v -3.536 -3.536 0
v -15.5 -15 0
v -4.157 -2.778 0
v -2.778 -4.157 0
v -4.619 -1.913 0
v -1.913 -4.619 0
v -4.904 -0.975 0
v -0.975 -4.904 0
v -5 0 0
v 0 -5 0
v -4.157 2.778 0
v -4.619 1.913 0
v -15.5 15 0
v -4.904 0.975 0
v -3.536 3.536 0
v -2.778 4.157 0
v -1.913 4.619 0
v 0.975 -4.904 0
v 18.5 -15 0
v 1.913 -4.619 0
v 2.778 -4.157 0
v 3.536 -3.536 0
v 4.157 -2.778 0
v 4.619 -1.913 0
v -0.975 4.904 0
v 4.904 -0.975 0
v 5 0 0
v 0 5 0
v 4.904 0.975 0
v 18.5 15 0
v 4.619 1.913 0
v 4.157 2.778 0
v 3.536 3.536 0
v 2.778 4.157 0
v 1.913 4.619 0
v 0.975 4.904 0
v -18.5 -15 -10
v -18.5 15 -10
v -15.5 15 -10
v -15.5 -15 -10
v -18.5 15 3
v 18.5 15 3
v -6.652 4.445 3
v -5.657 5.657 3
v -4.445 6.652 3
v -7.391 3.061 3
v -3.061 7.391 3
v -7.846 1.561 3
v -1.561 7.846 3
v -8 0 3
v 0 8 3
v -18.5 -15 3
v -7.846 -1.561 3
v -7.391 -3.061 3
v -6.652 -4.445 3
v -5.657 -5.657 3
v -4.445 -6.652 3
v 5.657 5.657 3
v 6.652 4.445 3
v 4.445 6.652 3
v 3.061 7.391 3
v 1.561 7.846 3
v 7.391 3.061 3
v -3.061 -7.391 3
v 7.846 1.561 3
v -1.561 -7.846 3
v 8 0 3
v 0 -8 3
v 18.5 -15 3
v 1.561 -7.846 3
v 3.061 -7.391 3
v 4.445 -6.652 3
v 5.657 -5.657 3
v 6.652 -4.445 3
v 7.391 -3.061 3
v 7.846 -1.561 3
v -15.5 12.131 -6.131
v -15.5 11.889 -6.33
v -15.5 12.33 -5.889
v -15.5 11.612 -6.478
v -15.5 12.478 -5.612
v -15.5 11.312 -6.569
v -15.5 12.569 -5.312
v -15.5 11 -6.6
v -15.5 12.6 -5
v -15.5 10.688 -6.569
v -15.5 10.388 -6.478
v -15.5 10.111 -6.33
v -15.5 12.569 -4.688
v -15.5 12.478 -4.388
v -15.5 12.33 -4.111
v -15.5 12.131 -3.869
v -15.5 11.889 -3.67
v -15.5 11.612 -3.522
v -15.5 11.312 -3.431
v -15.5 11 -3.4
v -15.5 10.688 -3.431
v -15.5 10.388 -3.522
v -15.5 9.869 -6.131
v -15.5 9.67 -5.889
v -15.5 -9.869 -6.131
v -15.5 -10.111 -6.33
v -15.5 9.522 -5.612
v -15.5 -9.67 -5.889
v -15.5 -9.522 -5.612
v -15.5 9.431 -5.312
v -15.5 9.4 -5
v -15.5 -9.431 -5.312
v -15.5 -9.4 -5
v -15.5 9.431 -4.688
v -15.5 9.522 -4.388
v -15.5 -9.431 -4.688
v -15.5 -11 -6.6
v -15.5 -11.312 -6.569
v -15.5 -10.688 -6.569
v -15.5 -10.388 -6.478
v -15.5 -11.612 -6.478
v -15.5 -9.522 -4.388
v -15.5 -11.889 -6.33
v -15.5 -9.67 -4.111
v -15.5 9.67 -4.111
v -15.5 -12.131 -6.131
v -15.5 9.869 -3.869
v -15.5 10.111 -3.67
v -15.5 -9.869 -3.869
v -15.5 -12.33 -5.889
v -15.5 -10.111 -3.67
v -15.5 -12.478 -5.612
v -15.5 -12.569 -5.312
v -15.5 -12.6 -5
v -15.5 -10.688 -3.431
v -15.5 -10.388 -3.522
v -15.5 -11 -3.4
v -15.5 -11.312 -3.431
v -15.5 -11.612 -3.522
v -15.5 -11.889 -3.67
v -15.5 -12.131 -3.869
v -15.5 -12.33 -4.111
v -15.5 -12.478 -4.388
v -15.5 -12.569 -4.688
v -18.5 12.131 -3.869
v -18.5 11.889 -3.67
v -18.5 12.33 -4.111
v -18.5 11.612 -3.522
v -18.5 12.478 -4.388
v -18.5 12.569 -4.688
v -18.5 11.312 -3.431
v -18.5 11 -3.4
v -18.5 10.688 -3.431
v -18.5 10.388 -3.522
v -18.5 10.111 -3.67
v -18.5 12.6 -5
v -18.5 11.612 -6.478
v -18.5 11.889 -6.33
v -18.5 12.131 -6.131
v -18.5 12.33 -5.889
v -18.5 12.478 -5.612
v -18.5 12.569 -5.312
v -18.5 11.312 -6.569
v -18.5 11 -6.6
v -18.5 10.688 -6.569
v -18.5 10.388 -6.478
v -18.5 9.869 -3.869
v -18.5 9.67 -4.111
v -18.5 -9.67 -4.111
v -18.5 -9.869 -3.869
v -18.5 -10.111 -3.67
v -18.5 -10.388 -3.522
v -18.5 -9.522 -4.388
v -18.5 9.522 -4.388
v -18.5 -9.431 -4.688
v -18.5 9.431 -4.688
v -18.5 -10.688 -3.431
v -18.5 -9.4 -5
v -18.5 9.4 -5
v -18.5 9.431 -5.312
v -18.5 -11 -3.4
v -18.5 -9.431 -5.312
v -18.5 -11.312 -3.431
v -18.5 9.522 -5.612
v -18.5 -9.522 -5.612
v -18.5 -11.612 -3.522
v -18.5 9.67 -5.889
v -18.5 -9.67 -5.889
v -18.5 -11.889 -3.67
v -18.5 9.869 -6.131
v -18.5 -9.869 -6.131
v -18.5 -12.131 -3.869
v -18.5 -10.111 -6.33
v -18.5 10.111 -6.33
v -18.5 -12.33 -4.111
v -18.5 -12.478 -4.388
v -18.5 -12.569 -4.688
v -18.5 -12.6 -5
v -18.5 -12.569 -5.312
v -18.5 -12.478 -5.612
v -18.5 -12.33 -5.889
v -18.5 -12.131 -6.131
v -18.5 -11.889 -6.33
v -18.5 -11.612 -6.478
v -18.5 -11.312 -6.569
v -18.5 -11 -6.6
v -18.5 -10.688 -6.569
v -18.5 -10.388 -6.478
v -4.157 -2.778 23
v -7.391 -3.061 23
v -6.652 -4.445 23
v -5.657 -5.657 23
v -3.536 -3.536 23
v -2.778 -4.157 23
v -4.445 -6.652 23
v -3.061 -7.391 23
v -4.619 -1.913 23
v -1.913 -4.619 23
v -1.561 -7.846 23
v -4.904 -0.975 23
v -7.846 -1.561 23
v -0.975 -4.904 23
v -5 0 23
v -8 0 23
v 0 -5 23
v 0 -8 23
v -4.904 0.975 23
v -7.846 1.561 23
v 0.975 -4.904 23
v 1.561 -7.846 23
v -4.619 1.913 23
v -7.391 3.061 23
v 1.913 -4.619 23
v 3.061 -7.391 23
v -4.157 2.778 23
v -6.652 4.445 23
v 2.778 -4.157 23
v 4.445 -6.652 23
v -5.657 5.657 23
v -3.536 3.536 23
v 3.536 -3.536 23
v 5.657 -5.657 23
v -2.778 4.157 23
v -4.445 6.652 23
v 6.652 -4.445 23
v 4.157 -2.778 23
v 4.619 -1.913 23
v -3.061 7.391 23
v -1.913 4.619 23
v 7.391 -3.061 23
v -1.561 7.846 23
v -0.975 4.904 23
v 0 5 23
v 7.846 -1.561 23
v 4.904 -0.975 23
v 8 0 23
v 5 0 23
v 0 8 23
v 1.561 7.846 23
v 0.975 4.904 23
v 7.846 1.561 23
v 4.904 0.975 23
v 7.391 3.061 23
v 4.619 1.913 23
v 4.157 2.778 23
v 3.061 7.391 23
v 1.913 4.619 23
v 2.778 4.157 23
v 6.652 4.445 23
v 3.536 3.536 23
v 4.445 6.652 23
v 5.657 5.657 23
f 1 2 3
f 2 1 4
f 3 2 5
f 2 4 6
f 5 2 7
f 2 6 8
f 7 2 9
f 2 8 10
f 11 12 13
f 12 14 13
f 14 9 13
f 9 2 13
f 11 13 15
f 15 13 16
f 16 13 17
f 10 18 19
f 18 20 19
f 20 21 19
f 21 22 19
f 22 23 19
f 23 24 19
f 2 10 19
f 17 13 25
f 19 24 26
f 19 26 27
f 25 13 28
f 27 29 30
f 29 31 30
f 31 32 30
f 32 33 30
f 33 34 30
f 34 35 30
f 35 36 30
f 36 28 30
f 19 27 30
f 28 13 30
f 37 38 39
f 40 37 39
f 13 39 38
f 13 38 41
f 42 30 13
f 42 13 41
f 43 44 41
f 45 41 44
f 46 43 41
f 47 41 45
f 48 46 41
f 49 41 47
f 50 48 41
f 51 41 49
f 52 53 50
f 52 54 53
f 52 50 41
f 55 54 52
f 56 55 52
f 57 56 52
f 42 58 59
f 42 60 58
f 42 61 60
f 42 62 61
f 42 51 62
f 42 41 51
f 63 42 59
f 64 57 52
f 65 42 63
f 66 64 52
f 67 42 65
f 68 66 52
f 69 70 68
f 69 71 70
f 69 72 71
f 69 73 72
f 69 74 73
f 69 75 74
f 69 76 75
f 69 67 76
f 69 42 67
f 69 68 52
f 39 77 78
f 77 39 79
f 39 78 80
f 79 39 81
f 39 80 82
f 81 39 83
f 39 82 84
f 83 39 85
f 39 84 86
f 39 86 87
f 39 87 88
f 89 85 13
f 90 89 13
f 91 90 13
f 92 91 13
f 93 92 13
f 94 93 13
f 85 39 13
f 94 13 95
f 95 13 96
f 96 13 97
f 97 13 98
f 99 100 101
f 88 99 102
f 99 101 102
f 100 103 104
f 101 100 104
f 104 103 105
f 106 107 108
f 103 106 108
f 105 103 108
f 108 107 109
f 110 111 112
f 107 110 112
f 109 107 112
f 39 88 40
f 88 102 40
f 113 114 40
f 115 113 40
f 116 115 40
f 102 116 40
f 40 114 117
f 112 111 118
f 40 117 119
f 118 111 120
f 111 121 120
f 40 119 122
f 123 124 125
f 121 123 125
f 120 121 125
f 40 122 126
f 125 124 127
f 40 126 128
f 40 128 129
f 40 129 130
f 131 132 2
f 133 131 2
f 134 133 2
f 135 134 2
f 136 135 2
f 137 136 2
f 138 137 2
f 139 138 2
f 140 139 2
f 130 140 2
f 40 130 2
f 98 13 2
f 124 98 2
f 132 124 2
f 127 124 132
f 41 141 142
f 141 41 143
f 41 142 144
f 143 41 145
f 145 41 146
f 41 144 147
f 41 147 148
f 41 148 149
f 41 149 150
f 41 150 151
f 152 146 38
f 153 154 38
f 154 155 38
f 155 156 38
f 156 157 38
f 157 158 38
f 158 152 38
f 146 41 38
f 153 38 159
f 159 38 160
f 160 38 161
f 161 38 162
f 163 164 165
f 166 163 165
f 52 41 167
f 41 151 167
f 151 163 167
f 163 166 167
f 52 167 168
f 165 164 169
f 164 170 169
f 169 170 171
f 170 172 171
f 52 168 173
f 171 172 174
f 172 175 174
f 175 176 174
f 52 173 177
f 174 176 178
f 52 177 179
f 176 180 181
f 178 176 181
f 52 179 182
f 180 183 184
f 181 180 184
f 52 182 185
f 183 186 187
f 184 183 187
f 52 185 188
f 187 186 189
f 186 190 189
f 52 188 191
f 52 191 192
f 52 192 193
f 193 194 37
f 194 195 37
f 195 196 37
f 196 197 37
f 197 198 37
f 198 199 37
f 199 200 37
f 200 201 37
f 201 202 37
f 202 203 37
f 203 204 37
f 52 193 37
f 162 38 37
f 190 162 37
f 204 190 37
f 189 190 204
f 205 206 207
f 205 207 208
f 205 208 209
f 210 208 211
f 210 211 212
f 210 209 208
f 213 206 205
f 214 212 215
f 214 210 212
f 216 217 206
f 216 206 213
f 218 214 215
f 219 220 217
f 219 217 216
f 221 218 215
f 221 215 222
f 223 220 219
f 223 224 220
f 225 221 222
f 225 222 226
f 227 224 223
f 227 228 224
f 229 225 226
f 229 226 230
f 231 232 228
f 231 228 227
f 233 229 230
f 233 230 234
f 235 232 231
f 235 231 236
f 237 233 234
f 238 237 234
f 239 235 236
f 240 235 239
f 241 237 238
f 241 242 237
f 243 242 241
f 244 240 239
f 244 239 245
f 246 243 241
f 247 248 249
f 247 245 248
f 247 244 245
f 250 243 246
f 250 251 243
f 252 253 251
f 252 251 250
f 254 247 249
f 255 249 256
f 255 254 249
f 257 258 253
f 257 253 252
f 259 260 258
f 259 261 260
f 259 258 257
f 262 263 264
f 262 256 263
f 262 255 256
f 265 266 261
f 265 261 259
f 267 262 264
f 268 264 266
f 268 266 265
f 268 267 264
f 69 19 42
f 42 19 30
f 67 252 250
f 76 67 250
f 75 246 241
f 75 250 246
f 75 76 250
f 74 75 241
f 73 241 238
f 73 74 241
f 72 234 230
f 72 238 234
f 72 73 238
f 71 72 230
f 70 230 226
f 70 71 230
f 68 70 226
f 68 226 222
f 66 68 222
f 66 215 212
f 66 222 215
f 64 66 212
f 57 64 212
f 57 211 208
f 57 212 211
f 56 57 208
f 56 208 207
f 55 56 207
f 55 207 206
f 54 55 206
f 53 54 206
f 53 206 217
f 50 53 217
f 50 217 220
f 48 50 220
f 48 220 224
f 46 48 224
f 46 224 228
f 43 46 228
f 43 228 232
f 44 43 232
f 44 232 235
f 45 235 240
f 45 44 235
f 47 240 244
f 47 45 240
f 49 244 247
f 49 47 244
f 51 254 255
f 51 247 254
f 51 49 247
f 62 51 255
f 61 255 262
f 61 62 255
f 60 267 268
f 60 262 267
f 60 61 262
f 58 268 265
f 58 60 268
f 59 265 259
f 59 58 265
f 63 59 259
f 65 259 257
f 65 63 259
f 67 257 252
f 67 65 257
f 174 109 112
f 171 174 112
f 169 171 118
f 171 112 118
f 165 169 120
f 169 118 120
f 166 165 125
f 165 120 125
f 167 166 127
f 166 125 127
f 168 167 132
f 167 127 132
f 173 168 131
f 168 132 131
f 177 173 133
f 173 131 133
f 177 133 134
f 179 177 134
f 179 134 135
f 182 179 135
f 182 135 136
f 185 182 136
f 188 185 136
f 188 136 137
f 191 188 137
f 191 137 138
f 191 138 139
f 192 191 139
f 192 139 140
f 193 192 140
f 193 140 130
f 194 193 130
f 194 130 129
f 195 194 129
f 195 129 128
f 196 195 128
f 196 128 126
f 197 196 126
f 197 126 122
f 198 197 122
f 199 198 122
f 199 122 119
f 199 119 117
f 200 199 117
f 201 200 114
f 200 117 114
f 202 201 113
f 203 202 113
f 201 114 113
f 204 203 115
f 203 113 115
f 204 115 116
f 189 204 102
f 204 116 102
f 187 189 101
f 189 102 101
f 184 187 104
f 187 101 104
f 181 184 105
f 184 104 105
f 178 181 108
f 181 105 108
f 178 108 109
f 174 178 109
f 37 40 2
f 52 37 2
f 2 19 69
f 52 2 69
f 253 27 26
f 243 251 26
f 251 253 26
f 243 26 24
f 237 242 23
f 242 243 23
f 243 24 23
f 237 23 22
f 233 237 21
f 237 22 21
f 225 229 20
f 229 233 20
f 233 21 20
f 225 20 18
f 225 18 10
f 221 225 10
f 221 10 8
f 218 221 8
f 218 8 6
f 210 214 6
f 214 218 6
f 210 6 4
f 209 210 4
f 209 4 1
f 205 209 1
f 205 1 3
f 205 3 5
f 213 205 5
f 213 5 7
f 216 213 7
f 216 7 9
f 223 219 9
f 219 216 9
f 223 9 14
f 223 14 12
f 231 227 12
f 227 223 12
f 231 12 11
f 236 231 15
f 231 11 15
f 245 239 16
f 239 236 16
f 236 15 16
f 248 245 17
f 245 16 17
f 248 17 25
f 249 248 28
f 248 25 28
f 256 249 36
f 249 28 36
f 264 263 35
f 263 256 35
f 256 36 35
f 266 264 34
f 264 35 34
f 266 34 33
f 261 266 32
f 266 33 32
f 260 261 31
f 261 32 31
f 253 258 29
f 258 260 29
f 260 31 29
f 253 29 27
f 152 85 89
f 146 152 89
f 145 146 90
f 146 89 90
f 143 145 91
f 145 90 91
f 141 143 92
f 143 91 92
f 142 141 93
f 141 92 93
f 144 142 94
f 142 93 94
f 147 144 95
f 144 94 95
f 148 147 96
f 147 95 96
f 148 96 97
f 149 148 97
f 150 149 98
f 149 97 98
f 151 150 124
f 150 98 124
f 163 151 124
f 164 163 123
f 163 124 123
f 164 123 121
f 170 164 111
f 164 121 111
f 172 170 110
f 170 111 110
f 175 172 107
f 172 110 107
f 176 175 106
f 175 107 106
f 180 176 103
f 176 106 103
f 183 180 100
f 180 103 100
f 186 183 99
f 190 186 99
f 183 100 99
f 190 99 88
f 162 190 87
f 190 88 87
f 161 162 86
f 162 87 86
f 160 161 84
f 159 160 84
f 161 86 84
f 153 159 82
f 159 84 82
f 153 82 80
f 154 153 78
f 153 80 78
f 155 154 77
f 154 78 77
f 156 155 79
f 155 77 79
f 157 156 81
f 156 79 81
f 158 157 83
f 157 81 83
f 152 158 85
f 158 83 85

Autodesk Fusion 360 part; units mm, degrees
sketch "Sketch1" plane through (0, 0, 0) normal (0, 0, 1) x (1, 0, 0)
  line L0 (18.5, 15) -> (-18.5, 15)
  line L1 (-18.5, 15) -> (-18.5, -15)
  line L2 (-18.5, -15) -> (18.5, -15)
  line L3 (18.5, -15) -> (18.5, 15)
  line L4 (18.5, 15) -> (-18.5, -15) construction
  line L5 (-18.5, 15) -> (18.5, -15) construction
  circle A0 centre (0, 0) radius 8
  circle A1 centre (0, 0) radius 5
  line L6 (-18.5, 15) -> (-15.5, 15)
  line L7 (-15.5, 15) -> (-15.5, -15)
  line L8 (-15.5, -15) -> (-18.5, -15)
  line L9 (-18.5, -15) -> (-18.5, 15)
  line L10 (-18.5, 15) -> (-15.5, -15) construction
  line L11 (-15.5, 15) -> (-18.5, -15) construction
  line L12 (0, 15) -> (0, -15) construction
  point P0 (-17, 0)
  dimension "d1" = 37
  dimension "d2" = 30
  dimension "d3" = 16
  dimension "d4" = 10
  dimension "d5" = 30
  dimension "d6" = 3
extrude "Extrude1" add sketch "Sketch1" against normal blind 10 contours L0 L1 L2 L6 L7 L8 L9 makes body 1
extrude "Extrude2" add sketch "Sketch1" along normal blind 3 separate body contours L0 L2 L3 L7 makes body 2
move_body "Move1" bodies 1 to x (1, 0, 0) y (0, 1, 0) z (0, 0, 1) at (3, 0, 0)
extrude "Extrude3" add sketch "Sketch1" along normal blind 23 contours A0 bodies 2
sketch "Sketch2" plane through (0, 0, 0) normal (1, 0, 0) x (0, 1, 0)
  line L0 (15, -5) -> (-15, -5) construction
  line L1 (15, -10) -> (-15, -10) construction
  line L2 (11, 3) -> (11, -10) construction
  line L3 (15, 3) -> (15, -10) construction
  line L4 (0, 3) -> (0, -10) construction
  circle A0 centre (11, -5) radius 1.6
  circle A1 centre (-11, -5) radius 1.6
  dimension "d13" = 5
  dimension "d14" = 13
  dimension "d15" = 4
  dimension "d16" = 3.2
extrude "Extrude4" cut sketch "Sketch2" against normal blind 20 contours A1 bodies 1
extrude "Extrude5" cut sketch "Sketch2" against normal blind 35 contours A0 bodies 1
sketch "Sketch3" plane through (0, 0, 0) normal (0, 1, 0) x (1, 0, 0)
  line L0 (-15.5, -3) -> (18.5, -3)
  dimension "d21" = 34
move_body "Move2" bodies 1 to x (1, 0, 0) y (0, 1, 0) z (0, 0, 1) at (-3, 0, 0)
extrude "Extrude6" add 1 faces at (-15.5, 5, 1) along direction (-1, 0, 0) blind 3 on bodies 2 bodies 1 2
sketch "Sketch4" plane through (0, 0, 0) normal (0, 1, 0) x (1, 0, 0)
sketch "Sketch5" plane through (0, 0, 0) normal (0, 0, 1) x (1, 0, 0)
  line L0 (-16, 0) -> (-19, 0) construction
